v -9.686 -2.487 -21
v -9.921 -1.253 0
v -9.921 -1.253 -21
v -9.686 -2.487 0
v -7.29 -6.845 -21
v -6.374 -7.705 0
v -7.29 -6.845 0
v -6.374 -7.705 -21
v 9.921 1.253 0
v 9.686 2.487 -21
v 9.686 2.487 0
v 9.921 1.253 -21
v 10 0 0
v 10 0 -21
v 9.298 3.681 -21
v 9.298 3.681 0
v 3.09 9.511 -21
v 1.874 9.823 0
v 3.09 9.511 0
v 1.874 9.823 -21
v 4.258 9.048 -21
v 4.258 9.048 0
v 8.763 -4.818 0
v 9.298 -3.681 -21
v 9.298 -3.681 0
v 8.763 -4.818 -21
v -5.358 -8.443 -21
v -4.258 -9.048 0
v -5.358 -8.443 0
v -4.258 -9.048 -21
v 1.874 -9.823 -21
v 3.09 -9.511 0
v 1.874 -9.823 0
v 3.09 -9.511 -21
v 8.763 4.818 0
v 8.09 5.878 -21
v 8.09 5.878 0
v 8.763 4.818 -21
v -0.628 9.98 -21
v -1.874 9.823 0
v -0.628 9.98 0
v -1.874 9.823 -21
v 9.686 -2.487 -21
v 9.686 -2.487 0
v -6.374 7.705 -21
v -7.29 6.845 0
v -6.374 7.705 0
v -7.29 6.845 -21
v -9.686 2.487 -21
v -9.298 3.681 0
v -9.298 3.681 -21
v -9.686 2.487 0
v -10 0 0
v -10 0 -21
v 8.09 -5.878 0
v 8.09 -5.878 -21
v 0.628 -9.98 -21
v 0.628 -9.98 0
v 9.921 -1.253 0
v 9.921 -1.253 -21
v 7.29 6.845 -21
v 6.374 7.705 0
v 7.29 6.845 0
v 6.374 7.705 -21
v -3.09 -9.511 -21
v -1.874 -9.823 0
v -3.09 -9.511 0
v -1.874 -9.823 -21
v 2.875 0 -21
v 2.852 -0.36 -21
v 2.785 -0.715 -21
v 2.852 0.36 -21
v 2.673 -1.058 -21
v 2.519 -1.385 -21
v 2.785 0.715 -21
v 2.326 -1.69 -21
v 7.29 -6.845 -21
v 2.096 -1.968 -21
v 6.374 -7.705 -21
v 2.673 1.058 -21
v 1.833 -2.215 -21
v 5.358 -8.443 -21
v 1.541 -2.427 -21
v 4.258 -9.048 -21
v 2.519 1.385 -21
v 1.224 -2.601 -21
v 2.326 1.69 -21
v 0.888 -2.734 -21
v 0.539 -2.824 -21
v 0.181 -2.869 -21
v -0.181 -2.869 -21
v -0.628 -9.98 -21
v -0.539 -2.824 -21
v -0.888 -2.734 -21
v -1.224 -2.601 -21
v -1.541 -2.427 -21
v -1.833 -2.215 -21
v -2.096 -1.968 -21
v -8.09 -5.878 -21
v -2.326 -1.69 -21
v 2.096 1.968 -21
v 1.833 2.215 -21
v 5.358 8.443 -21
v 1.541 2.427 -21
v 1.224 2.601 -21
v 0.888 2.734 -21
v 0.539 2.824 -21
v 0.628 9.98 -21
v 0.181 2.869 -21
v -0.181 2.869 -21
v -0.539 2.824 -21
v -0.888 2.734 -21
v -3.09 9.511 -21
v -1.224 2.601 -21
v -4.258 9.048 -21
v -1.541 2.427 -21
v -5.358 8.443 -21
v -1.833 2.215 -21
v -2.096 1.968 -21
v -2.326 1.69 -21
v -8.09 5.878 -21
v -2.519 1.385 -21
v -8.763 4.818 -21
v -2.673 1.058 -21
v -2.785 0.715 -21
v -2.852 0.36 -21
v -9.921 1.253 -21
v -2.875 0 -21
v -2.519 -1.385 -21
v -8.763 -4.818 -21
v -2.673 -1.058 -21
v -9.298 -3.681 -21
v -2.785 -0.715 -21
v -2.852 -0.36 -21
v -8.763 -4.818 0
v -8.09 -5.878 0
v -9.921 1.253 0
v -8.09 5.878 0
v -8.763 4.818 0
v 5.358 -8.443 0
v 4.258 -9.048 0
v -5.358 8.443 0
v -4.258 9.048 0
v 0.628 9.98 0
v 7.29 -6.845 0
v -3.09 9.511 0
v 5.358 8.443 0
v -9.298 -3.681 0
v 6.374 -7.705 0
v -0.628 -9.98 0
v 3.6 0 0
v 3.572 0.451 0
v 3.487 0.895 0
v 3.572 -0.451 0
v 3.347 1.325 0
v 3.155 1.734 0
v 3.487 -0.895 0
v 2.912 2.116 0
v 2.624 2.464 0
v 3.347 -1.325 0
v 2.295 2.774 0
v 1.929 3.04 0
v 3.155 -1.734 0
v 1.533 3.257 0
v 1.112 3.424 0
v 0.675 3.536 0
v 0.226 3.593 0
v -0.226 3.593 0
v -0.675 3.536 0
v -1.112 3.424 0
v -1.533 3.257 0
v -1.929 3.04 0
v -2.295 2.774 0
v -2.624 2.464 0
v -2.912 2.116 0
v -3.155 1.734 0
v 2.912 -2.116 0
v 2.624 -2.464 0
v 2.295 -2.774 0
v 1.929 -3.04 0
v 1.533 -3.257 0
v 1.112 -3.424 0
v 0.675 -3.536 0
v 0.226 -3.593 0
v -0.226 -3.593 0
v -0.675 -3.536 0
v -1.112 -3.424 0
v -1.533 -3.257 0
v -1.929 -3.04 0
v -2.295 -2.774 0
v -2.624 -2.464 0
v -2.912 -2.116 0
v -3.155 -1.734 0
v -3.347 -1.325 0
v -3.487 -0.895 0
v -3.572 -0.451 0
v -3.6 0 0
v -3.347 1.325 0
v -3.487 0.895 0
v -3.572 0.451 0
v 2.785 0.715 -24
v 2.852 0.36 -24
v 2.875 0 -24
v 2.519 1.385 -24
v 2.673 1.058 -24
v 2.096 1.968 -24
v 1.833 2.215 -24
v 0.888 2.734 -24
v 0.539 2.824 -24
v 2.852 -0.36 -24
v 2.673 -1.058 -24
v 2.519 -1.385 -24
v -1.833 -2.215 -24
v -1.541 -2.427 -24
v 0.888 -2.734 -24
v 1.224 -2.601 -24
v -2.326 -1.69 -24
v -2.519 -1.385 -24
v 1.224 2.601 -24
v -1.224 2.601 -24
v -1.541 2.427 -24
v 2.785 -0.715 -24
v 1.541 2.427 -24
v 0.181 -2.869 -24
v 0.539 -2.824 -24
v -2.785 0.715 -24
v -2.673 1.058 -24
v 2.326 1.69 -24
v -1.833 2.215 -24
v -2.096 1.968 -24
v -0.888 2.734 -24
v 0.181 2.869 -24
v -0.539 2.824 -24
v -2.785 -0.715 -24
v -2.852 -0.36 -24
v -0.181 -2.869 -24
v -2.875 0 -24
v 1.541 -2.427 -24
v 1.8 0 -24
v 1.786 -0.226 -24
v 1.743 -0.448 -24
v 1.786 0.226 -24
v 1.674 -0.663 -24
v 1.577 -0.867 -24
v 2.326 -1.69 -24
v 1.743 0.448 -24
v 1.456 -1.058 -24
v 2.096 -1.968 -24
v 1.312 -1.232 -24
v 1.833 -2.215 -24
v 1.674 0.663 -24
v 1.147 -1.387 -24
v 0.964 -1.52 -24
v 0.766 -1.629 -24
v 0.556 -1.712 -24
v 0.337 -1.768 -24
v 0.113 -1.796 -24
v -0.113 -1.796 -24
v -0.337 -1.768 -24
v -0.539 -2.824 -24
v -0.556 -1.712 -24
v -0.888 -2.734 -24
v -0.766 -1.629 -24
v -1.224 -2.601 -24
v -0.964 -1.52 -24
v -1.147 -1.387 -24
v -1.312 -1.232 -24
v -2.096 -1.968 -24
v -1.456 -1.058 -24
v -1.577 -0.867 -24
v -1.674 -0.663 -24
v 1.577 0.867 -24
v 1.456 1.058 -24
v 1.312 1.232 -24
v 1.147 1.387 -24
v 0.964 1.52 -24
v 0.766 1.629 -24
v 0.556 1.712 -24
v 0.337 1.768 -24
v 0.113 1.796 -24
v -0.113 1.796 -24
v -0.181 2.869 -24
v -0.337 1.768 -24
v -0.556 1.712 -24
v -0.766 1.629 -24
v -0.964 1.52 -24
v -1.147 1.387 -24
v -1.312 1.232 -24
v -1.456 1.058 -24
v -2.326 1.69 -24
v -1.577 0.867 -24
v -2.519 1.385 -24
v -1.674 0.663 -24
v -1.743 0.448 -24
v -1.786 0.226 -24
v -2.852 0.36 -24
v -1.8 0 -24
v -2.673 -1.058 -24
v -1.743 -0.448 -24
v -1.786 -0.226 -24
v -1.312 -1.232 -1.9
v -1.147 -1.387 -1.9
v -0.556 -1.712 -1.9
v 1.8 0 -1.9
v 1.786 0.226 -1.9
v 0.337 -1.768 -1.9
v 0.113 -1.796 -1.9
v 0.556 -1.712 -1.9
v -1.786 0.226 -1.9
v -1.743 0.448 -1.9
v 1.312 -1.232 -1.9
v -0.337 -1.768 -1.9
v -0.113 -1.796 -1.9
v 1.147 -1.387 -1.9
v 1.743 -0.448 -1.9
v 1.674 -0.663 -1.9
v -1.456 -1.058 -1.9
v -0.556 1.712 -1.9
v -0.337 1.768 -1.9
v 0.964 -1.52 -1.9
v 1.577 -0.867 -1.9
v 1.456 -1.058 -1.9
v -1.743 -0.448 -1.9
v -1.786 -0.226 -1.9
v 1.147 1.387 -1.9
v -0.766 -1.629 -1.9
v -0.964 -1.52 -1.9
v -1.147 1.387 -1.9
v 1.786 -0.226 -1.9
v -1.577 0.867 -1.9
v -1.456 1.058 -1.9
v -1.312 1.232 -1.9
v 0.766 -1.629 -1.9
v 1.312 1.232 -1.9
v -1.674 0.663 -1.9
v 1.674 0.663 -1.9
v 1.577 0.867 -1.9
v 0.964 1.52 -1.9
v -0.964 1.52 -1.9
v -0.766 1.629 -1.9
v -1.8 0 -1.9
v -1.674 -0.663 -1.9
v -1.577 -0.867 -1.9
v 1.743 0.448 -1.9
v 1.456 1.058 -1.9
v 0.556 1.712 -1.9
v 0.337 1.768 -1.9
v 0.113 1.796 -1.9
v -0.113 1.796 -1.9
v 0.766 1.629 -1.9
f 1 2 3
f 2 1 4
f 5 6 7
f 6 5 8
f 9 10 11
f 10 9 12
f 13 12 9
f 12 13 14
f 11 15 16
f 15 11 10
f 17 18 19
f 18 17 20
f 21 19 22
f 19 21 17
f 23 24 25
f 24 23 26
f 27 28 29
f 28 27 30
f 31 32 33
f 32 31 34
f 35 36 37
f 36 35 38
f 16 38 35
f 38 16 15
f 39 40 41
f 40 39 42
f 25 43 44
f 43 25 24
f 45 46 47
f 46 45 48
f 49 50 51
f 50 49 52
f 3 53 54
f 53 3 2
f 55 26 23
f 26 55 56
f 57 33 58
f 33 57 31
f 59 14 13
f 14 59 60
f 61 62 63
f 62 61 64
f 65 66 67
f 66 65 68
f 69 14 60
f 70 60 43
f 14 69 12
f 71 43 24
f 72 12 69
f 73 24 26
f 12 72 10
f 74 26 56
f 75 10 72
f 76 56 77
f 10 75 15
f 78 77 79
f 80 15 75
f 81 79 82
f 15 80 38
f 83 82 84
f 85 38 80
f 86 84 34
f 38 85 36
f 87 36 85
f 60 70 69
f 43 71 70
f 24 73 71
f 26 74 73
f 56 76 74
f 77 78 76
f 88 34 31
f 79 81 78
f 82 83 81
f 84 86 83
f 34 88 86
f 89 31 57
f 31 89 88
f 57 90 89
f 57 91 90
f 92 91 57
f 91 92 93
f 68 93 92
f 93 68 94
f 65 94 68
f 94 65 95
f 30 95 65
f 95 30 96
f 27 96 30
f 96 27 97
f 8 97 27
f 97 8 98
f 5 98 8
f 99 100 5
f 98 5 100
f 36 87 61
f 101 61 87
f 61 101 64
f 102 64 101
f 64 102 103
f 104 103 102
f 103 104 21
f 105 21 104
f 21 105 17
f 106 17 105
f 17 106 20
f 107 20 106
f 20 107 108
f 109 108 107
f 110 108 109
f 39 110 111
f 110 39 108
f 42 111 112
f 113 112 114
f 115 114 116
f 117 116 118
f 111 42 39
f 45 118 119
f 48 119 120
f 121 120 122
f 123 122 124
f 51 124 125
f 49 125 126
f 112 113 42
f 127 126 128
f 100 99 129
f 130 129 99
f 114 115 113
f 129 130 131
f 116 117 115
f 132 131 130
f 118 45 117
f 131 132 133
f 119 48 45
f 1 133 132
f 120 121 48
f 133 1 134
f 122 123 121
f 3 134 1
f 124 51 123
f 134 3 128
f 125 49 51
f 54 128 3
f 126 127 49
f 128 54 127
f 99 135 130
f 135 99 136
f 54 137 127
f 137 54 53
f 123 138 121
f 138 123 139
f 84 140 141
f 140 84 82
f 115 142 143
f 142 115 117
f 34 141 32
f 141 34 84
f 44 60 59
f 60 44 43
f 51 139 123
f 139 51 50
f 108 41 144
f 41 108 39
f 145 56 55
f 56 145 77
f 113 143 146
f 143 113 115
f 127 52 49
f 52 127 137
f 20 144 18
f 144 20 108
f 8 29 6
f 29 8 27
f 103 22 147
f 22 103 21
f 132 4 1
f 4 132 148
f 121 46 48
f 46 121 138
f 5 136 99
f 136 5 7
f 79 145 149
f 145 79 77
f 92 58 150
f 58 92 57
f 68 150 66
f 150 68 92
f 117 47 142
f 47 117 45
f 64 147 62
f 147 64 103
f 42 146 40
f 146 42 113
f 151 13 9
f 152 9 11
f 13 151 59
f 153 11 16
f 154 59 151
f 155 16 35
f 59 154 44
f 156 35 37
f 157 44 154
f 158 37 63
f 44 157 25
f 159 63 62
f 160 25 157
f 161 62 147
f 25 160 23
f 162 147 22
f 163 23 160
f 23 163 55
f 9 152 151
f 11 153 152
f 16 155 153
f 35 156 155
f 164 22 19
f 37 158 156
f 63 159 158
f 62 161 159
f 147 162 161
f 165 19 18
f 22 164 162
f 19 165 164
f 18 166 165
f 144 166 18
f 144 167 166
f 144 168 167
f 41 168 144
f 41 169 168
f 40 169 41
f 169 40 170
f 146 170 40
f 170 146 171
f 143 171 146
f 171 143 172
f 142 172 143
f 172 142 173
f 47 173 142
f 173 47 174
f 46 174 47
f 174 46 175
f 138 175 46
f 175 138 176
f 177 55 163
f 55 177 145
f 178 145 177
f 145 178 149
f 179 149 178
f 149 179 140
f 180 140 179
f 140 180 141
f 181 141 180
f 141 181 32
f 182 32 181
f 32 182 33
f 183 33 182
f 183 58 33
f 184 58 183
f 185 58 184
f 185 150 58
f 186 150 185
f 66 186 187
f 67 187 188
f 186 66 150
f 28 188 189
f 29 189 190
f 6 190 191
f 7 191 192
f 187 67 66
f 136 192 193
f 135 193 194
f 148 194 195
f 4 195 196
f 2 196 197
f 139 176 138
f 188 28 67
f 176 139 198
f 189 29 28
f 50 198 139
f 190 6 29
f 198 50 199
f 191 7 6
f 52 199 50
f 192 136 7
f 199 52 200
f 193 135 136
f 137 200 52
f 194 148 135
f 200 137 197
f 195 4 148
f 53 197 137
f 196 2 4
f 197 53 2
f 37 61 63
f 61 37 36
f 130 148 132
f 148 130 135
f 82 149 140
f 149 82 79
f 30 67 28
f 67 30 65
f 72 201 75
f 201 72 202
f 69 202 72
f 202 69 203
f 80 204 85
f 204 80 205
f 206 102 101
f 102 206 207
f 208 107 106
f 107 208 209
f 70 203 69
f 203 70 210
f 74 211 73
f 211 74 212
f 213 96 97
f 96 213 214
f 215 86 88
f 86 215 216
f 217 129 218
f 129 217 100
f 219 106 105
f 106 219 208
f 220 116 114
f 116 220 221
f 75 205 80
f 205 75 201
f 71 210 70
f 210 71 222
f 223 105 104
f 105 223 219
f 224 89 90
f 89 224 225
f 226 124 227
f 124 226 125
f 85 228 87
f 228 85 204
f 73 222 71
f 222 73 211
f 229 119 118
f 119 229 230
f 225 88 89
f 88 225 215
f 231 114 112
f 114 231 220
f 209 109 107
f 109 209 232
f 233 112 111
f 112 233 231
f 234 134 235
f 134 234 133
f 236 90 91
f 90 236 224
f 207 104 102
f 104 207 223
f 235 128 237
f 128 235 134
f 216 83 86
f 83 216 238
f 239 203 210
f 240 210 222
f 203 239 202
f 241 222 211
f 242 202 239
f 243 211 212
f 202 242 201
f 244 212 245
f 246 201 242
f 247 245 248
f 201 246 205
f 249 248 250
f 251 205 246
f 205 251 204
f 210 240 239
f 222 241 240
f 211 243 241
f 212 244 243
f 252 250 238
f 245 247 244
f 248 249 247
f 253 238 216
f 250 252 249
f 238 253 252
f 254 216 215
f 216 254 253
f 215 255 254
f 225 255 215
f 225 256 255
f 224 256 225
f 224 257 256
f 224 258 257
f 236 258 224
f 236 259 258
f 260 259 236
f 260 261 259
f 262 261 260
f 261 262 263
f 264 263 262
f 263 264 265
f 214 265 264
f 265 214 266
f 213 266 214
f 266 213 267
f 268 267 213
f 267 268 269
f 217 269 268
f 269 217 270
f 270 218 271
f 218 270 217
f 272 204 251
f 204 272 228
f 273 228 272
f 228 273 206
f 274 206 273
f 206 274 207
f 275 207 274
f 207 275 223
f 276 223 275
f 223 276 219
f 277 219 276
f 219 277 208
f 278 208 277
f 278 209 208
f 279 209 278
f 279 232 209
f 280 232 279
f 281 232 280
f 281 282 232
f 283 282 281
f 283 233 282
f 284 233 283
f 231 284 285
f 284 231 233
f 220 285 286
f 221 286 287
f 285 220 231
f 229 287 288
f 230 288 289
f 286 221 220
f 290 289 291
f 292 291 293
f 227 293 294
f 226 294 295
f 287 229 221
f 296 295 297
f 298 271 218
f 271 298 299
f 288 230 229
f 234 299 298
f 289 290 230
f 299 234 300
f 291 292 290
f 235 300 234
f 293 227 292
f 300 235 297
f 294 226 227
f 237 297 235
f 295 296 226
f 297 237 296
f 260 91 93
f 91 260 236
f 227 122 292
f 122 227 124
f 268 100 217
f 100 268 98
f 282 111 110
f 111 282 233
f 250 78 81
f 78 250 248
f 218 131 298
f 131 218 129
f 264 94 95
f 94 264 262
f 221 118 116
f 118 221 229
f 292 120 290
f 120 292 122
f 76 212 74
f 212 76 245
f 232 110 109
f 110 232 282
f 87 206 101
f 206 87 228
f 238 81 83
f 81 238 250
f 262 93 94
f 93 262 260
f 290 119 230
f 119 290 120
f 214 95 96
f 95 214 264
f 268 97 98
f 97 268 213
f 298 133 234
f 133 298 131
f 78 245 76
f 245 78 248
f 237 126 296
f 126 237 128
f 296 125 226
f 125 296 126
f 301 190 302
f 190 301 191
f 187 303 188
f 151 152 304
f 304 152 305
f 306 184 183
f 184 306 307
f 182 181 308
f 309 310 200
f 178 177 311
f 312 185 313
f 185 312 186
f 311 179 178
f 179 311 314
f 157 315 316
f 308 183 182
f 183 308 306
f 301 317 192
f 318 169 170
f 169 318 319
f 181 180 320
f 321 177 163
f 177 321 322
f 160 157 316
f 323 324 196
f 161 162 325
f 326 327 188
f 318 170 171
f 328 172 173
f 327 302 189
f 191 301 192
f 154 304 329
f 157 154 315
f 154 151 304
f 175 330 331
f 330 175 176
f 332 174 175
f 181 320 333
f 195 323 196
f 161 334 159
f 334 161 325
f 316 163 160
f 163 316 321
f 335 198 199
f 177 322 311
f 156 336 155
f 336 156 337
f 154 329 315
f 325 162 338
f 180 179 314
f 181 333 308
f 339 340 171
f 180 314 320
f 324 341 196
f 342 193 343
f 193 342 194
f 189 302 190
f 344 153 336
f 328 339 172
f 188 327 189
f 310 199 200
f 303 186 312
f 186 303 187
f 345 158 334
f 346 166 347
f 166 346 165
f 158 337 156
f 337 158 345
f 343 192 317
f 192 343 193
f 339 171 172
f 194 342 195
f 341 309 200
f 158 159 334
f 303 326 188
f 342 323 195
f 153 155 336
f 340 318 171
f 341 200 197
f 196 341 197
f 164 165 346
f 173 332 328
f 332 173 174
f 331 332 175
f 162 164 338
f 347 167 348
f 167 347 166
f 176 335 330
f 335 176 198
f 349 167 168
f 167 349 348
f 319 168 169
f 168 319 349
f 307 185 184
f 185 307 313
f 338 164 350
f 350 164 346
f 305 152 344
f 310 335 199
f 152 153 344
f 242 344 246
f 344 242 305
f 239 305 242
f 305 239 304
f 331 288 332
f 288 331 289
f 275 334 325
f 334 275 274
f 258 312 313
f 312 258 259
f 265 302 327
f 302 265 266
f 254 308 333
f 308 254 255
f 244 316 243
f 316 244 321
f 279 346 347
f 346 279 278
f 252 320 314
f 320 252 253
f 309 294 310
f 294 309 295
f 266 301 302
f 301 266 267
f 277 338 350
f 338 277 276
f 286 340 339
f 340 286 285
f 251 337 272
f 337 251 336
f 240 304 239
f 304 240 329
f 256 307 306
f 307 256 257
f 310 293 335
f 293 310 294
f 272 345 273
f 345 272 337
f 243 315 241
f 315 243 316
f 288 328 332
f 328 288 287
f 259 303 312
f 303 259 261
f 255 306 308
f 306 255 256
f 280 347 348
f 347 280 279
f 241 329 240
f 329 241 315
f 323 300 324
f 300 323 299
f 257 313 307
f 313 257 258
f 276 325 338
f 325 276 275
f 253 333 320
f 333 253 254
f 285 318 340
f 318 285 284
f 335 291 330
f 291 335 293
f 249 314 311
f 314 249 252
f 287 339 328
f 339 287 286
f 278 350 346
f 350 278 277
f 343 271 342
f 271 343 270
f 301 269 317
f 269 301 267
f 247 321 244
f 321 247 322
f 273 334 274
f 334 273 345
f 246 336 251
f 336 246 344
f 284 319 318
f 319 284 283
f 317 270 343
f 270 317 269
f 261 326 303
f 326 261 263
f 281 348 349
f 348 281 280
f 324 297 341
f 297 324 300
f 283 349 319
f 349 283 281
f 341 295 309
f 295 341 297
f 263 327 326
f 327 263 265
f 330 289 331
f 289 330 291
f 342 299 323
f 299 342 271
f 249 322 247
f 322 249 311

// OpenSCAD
$fn = 50;


difference() {
	union() {
		translate(v = [0, 0, -21.0000000000]) {
			cylinder(h = 21, r = 10.0000000000);
		}
		#translate(v = [0, 0, -24.0000000000]) {
			cylinder(h = 24, r = 2.8750000000);
		}
	}
	union() {
		translate(v = [0, 0, 0]) {
			rotate(a = [0, 0, 0]) {
				difference() {
					union() {
						translate(v = [0, 0, -24.0000000000]) {
							cylinder(h = 24, r = 1.5000000000);
						}
						translate(v = [0, 0, -1.9000000000]) {
							cylinder(h = 1.9000000000, r1 = 1.8000000000, r2 = 3.6000000000);
						}
						translate(v = [0, 0, -24.0000000000]) {
							cylinder(h = 24, r = 1.8000000000);
						}
						translate(v = [0, 0, -24.0000000000]) {
							cylinder(h = 24, r = 1.5000000000);
						}
					}
					union();
				}
			}
		}
	}
}
